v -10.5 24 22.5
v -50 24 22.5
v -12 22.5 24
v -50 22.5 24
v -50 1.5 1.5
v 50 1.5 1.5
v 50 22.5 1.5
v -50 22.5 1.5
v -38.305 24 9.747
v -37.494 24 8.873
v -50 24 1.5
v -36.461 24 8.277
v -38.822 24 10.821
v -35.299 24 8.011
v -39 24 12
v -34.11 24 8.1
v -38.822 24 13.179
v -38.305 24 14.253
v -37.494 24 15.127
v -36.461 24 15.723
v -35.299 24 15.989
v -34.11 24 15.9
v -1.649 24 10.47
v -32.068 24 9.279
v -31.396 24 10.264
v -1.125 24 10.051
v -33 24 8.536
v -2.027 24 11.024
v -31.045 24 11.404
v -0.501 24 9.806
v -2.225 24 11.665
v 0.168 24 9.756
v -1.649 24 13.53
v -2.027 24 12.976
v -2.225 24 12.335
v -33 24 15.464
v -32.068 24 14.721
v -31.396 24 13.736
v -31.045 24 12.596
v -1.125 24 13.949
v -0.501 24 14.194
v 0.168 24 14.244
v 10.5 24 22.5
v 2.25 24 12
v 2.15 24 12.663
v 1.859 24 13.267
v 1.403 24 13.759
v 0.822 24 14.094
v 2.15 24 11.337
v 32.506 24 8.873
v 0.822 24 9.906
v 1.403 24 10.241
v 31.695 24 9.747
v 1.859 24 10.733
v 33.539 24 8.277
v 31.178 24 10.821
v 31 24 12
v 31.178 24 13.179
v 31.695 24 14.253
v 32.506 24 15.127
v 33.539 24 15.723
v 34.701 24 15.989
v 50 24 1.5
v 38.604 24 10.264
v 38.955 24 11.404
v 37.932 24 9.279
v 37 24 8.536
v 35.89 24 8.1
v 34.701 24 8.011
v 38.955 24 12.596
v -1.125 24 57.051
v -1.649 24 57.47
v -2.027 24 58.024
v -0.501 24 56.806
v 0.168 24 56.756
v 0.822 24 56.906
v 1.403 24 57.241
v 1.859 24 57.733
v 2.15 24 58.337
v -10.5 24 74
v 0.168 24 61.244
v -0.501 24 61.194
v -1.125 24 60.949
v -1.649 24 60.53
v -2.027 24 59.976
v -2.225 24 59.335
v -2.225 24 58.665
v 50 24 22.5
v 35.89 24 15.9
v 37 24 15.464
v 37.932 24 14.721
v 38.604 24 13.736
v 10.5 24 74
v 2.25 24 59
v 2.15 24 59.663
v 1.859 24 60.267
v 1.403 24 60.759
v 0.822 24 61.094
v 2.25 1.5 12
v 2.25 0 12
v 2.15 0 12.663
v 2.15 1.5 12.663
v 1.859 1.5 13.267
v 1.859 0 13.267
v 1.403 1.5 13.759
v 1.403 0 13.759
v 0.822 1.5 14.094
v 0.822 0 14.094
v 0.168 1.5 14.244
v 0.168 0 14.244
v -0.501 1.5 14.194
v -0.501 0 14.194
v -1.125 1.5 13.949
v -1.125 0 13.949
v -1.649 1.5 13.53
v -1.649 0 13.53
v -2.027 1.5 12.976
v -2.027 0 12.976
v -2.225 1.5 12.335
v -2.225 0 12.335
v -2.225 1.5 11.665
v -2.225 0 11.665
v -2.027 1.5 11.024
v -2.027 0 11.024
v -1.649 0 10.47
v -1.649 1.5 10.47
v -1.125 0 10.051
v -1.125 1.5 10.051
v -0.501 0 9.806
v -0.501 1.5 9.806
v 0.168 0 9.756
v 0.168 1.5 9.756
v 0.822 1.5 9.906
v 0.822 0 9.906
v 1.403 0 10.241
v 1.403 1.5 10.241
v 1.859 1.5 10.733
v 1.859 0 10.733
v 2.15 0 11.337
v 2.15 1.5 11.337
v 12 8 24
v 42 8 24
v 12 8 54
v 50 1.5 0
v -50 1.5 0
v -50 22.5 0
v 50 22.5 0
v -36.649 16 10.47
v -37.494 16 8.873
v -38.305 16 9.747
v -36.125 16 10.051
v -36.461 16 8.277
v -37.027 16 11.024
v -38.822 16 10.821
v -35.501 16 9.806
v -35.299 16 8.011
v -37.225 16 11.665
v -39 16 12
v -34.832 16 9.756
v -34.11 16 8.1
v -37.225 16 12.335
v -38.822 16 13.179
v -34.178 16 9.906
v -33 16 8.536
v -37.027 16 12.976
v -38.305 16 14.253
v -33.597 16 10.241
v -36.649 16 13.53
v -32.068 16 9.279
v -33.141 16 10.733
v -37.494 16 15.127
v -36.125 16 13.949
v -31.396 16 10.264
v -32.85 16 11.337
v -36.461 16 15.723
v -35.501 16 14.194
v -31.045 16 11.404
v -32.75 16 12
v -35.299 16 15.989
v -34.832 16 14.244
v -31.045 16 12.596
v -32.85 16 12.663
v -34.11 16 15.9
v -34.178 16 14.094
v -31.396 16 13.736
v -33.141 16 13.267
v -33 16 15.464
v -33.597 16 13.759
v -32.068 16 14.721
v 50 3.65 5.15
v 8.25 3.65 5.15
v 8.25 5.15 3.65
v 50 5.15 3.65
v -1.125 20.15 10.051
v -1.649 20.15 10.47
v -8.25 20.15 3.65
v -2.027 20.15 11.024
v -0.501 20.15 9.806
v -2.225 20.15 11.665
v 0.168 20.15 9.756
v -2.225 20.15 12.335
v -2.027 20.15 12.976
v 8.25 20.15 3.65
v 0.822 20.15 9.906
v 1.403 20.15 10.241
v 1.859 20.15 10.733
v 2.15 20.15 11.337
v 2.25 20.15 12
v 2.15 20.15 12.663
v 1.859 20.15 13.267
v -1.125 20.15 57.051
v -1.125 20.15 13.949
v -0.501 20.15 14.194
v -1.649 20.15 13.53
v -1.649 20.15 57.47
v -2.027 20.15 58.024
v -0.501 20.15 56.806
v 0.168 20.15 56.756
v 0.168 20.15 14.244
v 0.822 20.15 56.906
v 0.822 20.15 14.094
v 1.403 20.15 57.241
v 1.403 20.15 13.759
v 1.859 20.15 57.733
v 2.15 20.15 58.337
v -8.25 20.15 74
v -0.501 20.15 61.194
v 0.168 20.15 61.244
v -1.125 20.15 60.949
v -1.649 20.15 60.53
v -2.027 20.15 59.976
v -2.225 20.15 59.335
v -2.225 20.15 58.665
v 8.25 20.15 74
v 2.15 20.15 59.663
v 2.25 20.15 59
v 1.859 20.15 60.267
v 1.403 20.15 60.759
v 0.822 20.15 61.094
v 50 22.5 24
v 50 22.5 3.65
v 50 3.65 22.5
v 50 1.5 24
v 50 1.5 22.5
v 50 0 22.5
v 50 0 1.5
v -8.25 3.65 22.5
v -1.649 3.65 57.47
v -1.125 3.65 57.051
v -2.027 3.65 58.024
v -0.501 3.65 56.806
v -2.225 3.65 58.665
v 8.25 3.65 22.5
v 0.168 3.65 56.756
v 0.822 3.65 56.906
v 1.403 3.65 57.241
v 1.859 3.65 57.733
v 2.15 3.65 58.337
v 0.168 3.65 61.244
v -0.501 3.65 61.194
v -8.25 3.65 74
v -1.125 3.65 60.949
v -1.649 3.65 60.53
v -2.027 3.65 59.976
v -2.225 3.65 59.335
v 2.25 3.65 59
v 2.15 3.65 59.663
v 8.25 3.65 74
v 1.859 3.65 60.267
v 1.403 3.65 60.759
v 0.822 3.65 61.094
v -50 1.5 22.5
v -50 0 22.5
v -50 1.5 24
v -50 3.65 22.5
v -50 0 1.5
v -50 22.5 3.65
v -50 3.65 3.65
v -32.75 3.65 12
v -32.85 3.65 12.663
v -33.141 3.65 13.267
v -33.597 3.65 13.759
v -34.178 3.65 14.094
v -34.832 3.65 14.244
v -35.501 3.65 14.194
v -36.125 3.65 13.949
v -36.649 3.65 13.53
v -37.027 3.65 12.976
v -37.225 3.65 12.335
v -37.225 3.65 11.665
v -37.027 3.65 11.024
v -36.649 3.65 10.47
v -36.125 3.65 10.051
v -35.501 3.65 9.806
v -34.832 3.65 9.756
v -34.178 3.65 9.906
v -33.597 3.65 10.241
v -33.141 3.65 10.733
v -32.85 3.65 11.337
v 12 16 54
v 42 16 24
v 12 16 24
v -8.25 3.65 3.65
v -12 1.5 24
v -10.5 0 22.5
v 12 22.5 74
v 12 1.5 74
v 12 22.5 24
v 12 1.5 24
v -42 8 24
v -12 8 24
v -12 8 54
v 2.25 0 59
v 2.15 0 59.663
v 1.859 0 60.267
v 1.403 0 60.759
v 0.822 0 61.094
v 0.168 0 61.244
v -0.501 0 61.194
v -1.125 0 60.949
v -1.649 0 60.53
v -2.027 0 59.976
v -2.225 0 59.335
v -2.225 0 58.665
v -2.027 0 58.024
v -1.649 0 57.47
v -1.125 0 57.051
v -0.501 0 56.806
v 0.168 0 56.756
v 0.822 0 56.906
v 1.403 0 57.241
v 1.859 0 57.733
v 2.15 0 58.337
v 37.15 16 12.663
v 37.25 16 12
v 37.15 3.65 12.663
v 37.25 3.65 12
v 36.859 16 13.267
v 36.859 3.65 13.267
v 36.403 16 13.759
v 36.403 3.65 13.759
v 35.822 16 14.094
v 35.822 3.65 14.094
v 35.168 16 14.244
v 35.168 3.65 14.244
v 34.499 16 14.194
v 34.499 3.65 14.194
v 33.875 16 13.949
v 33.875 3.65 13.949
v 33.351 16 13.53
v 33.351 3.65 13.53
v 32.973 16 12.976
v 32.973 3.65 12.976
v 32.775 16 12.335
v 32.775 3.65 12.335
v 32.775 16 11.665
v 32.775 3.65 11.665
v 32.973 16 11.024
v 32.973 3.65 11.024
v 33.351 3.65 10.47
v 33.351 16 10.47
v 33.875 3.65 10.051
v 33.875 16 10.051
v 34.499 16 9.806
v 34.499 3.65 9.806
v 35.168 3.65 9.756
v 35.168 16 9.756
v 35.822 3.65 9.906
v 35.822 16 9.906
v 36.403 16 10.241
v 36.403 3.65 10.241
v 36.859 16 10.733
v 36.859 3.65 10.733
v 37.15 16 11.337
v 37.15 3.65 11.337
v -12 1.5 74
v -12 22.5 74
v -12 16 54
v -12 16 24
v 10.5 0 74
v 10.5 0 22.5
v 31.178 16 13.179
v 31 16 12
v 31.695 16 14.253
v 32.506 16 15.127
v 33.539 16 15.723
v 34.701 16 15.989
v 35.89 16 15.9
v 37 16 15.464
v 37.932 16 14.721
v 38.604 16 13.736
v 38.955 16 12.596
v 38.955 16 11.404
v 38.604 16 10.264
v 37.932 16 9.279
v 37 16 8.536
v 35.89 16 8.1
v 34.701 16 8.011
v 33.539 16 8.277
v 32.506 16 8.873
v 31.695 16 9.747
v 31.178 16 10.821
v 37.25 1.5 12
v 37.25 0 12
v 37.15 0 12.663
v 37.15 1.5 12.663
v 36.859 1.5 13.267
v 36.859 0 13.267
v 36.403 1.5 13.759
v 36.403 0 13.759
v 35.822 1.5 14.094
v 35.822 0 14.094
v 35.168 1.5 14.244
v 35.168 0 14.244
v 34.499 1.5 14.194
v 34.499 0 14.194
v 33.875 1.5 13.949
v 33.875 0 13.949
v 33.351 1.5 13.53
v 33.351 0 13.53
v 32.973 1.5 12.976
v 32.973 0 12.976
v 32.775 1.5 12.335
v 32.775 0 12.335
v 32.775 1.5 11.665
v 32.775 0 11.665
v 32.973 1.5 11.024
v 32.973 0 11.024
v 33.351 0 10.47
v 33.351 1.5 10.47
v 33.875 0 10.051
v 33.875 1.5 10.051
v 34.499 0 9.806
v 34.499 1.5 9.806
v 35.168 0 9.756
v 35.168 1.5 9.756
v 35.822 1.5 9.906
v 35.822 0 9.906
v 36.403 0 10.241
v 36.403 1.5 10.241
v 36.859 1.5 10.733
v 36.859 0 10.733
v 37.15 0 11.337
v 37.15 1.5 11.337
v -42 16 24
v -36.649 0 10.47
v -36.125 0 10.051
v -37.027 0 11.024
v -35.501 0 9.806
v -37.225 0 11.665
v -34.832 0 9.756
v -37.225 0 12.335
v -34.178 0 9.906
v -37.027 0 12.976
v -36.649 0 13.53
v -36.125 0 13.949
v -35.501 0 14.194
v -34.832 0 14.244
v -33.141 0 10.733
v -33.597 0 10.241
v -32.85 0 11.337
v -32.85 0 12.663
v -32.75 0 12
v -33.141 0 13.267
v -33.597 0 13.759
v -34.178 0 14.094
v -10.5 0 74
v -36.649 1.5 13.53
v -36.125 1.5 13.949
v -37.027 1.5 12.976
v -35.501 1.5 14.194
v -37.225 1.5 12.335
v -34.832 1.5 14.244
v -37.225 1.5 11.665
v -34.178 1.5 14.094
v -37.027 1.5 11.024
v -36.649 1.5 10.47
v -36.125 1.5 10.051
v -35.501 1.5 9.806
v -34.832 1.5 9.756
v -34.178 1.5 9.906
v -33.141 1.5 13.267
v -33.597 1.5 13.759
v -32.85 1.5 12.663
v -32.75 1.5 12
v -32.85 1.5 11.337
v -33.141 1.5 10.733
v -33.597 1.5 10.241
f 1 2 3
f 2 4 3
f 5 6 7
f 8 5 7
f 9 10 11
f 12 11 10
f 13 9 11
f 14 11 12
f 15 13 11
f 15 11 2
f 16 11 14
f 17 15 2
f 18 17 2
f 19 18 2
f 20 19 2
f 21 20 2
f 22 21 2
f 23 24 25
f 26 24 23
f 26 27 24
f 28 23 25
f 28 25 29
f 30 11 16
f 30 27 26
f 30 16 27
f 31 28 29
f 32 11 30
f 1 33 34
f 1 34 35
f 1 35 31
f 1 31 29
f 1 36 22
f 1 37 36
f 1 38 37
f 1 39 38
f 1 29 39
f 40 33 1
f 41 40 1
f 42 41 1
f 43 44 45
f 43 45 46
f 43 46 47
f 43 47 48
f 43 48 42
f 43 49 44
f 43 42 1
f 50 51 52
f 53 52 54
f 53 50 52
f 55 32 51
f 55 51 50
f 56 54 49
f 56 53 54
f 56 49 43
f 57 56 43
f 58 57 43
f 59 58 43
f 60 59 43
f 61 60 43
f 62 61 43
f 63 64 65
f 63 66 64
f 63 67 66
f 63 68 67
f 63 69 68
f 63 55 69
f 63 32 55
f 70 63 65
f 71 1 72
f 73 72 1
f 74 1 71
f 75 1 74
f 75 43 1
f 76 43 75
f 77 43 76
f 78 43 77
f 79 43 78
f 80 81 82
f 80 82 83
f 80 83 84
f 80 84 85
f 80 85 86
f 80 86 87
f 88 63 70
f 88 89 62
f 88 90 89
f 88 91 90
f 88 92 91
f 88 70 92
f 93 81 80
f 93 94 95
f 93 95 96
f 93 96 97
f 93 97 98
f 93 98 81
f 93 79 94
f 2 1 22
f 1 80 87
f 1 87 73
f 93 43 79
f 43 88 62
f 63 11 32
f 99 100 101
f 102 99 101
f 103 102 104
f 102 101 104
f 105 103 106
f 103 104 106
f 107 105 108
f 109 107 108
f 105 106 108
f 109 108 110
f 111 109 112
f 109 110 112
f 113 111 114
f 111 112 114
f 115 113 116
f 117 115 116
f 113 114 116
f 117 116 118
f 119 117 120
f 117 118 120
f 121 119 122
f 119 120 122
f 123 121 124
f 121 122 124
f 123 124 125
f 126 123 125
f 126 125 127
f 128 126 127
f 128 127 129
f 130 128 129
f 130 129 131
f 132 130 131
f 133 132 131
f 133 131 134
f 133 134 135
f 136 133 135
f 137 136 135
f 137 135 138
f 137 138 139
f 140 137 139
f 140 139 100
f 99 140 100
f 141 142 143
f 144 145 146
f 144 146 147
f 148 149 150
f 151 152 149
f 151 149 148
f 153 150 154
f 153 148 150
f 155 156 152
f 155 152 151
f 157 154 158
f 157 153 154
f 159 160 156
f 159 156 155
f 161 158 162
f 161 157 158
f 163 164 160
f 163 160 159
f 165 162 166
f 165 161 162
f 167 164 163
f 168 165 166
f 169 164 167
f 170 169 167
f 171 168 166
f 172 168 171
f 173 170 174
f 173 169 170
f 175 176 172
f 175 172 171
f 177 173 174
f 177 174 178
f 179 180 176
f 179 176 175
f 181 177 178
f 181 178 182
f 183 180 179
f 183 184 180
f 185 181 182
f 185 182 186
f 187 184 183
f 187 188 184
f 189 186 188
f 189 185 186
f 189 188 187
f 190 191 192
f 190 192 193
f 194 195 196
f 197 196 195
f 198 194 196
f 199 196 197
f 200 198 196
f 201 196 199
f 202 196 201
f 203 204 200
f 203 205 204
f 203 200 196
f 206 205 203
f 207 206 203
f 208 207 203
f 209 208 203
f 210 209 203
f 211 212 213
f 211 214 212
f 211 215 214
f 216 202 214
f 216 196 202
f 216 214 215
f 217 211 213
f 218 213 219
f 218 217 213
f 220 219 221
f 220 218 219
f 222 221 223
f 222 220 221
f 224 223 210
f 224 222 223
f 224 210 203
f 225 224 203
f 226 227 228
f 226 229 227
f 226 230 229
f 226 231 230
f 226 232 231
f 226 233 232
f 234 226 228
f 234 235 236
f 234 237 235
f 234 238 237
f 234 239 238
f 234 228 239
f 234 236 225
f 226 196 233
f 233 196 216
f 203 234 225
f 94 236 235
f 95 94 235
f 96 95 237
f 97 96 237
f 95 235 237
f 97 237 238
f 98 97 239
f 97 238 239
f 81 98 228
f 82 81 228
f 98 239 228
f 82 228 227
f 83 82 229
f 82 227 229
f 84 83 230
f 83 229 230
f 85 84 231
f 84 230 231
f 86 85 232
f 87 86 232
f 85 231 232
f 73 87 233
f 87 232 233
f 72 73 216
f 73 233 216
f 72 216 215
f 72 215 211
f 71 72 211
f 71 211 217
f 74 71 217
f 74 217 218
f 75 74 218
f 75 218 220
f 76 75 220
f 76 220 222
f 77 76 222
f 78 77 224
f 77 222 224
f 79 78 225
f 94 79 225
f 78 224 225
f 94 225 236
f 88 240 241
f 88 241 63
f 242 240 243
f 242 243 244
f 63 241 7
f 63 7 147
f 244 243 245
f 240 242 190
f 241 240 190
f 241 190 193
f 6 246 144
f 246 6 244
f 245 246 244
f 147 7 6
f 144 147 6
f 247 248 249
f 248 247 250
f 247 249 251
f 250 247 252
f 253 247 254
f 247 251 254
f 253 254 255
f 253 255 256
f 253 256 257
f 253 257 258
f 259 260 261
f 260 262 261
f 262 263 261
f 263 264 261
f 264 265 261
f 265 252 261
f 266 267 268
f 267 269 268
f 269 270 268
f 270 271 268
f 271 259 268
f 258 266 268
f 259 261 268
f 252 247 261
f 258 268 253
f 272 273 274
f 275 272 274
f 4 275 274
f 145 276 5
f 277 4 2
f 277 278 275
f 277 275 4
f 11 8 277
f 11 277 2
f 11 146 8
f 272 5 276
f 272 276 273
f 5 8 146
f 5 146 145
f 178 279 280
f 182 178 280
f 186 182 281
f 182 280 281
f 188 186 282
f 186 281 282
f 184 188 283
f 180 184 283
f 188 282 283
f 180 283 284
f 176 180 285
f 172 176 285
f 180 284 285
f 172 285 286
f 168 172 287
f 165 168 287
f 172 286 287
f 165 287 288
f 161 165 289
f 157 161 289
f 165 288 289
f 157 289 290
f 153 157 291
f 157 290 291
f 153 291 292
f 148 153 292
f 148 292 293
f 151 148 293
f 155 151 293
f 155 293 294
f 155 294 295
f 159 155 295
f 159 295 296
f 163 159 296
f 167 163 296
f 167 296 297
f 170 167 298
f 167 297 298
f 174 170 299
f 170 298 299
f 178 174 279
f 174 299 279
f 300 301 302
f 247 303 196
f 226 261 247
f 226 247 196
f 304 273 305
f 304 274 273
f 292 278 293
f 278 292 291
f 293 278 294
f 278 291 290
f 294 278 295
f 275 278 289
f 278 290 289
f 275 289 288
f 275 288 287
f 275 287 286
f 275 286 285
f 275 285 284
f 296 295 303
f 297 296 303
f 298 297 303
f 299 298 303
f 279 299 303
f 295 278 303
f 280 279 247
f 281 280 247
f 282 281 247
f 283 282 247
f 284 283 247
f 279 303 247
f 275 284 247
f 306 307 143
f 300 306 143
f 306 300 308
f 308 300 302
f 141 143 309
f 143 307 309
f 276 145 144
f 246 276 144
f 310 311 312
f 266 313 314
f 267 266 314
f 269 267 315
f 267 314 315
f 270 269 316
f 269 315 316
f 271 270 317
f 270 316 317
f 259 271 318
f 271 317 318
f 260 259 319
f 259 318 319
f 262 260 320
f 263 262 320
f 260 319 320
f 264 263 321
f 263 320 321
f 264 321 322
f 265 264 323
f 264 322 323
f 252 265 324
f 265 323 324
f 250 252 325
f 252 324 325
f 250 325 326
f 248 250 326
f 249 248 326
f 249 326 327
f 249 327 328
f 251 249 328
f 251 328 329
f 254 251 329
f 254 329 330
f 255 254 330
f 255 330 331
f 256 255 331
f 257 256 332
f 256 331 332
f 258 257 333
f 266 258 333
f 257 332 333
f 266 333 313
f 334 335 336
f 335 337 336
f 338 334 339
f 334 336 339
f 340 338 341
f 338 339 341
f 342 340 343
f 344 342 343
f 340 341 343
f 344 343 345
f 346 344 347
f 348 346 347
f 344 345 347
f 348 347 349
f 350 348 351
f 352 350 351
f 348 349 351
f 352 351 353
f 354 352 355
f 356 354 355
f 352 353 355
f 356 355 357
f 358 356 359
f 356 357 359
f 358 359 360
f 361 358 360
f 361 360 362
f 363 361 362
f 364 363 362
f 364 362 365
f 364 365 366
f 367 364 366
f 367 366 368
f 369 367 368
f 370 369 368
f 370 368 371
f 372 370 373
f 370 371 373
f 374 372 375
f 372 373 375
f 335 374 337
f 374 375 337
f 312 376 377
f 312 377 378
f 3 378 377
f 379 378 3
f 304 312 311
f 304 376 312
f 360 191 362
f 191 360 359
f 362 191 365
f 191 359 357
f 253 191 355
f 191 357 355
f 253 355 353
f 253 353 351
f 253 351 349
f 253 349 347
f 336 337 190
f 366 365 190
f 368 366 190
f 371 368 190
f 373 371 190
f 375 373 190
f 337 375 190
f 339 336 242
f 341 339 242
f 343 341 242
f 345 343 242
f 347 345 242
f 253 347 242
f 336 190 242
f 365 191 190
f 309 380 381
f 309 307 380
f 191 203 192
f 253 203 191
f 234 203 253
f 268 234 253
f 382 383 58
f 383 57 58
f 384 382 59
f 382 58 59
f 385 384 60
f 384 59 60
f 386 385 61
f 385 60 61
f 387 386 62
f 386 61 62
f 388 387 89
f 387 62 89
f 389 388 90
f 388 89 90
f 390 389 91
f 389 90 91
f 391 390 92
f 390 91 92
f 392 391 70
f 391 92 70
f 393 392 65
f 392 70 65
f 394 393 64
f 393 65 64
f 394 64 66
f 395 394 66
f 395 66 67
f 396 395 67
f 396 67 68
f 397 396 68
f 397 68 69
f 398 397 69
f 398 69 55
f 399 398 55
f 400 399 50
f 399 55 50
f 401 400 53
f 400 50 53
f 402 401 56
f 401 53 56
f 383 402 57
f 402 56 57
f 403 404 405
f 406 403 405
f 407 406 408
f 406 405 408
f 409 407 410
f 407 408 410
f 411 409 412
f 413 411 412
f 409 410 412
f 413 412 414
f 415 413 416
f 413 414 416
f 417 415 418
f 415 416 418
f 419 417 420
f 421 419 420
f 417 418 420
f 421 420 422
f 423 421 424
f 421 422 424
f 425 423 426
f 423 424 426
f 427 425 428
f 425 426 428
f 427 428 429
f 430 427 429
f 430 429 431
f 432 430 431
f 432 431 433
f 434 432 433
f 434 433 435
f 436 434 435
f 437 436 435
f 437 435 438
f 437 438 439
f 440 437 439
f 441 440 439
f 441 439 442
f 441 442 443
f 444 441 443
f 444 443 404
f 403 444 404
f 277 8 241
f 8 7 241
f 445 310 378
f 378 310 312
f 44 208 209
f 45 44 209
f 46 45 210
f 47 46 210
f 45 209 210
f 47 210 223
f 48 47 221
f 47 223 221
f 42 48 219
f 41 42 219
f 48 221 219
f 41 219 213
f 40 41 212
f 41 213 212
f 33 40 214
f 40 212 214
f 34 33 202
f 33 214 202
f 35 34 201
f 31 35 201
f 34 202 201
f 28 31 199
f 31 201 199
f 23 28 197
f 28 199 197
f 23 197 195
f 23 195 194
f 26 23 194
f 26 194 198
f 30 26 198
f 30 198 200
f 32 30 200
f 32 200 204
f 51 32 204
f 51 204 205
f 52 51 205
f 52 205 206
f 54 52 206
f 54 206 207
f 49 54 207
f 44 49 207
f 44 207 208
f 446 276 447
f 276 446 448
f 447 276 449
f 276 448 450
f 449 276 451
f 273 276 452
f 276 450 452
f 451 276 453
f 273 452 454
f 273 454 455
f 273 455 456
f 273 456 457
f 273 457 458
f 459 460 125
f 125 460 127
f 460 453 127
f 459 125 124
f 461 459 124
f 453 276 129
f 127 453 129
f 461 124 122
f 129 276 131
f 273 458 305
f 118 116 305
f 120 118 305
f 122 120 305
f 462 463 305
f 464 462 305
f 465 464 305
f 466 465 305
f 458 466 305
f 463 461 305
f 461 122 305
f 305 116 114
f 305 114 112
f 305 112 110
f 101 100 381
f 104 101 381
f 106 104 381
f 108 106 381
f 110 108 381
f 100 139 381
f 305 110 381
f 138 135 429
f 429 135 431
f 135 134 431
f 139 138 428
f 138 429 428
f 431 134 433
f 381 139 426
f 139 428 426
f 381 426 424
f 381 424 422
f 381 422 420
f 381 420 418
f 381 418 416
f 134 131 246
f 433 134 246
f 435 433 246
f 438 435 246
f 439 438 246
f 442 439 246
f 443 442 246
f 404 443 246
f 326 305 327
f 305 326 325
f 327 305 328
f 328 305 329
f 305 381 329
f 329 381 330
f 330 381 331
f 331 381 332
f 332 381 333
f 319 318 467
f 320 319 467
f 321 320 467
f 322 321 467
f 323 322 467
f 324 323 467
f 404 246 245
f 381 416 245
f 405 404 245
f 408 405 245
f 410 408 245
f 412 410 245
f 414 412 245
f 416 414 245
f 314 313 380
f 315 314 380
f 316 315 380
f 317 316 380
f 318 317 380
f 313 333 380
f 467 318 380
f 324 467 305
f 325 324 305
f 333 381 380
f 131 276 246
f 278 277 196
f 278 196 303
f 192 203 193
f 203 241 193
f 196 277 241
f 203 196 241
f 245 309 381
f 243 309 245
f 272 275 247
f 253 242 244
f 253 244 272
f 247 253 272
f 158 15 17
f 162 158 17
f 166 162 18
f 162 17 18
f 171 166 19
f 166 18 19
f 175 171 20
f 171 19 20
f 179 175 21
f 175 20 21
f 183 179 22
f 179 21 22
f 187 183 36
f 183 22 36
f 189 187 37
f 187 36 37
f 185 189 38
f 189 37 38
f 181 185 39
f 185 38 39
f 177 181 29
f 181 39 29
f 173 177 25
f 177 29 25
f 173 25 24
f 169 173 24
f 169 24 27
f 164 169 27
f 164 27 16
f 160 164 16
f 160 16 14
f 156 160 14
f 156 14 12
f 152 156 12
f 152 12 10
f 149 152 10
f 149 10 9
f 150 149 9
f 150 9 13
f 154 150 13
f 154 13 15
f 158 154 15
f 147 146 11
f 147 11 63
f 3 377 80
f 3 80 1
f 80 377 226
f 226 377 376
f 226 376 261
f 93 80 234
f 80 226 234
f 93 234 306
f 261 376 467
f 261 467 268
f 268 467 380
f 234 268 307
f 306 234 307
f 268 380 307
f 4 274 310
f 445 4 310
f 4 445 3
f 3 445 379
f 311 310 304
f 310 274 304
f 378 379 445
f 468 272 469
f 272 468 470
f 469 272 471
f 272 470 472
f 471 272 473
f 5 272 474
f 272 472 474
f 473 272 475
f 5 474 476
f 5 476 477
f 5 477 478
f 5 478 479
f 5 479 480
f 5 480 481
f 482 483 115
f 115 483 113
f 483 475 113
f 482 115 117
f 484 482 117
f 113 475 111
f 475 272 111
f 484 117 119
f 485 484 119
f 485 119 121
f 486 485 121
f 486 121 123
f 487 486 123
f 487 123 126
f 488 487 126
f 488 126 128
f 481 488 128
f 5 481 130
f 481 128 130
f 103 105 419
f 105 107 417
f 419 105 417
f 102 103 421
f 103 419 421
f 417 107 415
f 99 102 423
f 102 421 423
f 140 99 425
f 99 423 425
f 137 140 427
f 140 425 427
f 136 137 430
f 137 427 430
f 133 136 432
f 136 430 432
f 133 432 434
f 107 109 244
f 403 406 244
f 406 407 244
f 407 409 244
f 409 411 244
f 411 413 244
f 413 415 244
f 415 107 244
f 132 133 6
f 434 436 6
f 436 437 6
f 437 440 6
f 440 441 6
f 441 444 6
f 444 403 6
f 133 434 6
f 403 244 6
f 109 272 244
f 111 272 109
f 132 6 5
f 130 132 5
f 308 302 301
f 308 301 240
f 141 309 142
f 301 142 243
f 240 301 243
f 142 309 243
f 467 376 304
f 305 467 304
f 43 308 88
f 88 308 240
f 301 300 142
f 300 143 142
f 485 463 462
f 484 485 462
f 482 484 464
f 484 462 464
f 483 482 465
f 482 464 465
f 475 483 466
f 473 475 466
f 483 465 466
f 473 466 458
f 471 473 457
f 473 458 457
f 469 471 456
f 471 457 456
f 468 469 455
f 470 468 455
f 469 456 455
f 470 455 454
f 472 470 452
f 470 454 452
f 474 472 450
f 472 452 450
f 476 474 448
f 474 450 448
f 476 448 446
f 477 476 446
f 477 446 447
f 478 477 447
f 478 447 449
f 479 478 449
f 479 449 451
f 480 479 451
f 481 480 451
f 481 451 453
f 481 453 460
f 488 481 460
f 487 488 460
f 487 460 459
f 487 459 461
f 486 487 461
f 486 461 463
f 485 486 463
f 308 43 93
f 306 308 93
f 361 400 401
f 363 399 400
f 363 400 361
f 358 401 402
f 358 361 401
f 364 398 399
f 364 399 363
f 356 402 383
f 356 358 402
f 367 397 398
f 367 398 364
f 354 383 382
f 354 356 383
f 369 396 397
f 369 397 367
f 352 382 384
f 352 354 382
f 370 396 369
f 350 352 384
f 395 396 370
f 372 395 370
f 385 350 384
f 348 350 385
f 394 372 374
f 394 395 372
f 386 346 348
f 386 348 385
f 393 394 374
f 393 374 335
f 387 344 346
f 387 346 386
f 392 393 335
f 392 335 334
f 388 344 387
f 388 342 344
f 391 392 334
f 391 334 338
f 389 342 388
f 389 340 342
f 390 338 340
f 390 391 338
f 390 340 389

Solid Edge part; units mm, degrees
sketch "Sketch1" plane through (0, 0, 0) normal (0, -1, 0) x (1, 0, 0)
  line L0 (-12, 74) -> (12, 74)
  line L1 (12, 74) -> (12, 24)
  line L2 (12, 24) -> (50, 24)
  line L3 (50, 24) -> (50, 0)
  line L4 (-50, 0) -> (50, 0)
  line L5 (-50, 0) -> (-50, 24)
  line L6 (-50, 24) -> (-12, 24)
  line L7 (-12, 74) -> (-12, 24)
extrude "Protrusion1" add sketch "Sketch1" against normal blind 24
sketch "Sketch2" plane through (50, 12, 12) normal (1, 0, 0) x (0, 1, 0)
  line L0 (-8.35, -8.35) -> (-8.35, 10.5)
  line L1 (-8.35, 10.5) -> (-10.5, 10.5)
  line L2 (-10.5, 10.5) -> (-10.5, -10.5)
  line L3 (-10.5, -10.5) -> (10.5, -10.5)
  line L4 (10.5, -10.5) -> (10.5, -8.35)
  line L5 (10.5, -8.35) -> (-8.35, -8.35)
extrude "Cutout1" cut sketch "Sketch2" against normal through all
sketch "Sketch3" plane through (0, 12, 74) normal (0, 0, 1) x (1, 0, 0)
  line L0 (-8.25, -8.35) -> (8.25, -8.35)
  line L1 (8.25, 8.15) -> (8.25, -8.35)
  line L2 (-8.25, 8.15) -> (8.25, 8.15)
  line L3 (-8.25, -8.35) -> (-8.25, 8.15)
extrude "Cutout2" cut sketch "Sketch3" against normal up to surface (72.5 mm away)
sketch "Sketch4" plane through (-31, 12, 24) normal (0, 0, 1) x (0, -1, 0)
  line L0 (4, 19) -> (4, -19)
  line L1 (4, -19) -> (-4, -19)
  line L2 (-4, 19) -> (-4, -19)
  line L3 (-4, 19) -> (4, 19)
extrude "Protrusion2" add sketch "Sketch4" along normal up to surface (50 mm away)
sketch "Sketch5" plane through (-31, 8, 49) normal (0, -1, 0) x (1, 0, 0)
  line L0 (-11, -25) -> (19, 5)
  line L1 (19, 25) -> (19, 5)
  line L2 (-19, 25) -> (19, 25)
  line L3 (-19, -25) -> (-19, 25)
  line L4 (-11, -25) -> (-19, -25)
extrude "Cutout3" cut sketch "Sketch5" against normal through all
mirror "Mirror1" about plane through (0, 0, 0) normal (1, 0, 0) of "Protrusion2", "Cutout3"
chamfer "Chaflán_1" distance 1.5 angle 45 11 edges at (12, 24, 49) (12, 0, 49) (-12, 0, 49) (-12, 24, 49) (-31, 0, 24) (31, 0, 24) (0, 0, 0) (-31, 24, 24) (31, 24, 24) (0, 24, 0) (29.125, 3.65, 3.65)
sketch "Sketch6" plane through (0, 0, 37.75) normal (0, -1, 0) x (1, 0, 0)
  circle A0 centre (0, 21.25) radius 2.25
  circle A1 centre (0, -25.75) radius 2.25
  circle A2 centre (35, -25.75) radius 2.25
  circle A3 centre (-35, -25.75) radius 2.25
  dimension "D1" = 4.5
  dimension "D2" = 4.5
  dimension "D3" = 4.5
  dimension "D4" = 4.5
  dimension "D5" = 15
  dimension "D6" = 15
  dimension "D7" = 15
extrude "Cutout5" cut sketch "Sketch6" against normal through all
sketch "Sketch7" plane through (0, 24, 37.75) normal (0, 1, 0) x (-1, 0, 0)
  circle A0 centre (35, -25.75) radius 4
  circle A1 centre (-35, -25.75) radius 4
extrude "VaciadoExtruido_8" cut sketch "Sketch7" against normal blind 8
